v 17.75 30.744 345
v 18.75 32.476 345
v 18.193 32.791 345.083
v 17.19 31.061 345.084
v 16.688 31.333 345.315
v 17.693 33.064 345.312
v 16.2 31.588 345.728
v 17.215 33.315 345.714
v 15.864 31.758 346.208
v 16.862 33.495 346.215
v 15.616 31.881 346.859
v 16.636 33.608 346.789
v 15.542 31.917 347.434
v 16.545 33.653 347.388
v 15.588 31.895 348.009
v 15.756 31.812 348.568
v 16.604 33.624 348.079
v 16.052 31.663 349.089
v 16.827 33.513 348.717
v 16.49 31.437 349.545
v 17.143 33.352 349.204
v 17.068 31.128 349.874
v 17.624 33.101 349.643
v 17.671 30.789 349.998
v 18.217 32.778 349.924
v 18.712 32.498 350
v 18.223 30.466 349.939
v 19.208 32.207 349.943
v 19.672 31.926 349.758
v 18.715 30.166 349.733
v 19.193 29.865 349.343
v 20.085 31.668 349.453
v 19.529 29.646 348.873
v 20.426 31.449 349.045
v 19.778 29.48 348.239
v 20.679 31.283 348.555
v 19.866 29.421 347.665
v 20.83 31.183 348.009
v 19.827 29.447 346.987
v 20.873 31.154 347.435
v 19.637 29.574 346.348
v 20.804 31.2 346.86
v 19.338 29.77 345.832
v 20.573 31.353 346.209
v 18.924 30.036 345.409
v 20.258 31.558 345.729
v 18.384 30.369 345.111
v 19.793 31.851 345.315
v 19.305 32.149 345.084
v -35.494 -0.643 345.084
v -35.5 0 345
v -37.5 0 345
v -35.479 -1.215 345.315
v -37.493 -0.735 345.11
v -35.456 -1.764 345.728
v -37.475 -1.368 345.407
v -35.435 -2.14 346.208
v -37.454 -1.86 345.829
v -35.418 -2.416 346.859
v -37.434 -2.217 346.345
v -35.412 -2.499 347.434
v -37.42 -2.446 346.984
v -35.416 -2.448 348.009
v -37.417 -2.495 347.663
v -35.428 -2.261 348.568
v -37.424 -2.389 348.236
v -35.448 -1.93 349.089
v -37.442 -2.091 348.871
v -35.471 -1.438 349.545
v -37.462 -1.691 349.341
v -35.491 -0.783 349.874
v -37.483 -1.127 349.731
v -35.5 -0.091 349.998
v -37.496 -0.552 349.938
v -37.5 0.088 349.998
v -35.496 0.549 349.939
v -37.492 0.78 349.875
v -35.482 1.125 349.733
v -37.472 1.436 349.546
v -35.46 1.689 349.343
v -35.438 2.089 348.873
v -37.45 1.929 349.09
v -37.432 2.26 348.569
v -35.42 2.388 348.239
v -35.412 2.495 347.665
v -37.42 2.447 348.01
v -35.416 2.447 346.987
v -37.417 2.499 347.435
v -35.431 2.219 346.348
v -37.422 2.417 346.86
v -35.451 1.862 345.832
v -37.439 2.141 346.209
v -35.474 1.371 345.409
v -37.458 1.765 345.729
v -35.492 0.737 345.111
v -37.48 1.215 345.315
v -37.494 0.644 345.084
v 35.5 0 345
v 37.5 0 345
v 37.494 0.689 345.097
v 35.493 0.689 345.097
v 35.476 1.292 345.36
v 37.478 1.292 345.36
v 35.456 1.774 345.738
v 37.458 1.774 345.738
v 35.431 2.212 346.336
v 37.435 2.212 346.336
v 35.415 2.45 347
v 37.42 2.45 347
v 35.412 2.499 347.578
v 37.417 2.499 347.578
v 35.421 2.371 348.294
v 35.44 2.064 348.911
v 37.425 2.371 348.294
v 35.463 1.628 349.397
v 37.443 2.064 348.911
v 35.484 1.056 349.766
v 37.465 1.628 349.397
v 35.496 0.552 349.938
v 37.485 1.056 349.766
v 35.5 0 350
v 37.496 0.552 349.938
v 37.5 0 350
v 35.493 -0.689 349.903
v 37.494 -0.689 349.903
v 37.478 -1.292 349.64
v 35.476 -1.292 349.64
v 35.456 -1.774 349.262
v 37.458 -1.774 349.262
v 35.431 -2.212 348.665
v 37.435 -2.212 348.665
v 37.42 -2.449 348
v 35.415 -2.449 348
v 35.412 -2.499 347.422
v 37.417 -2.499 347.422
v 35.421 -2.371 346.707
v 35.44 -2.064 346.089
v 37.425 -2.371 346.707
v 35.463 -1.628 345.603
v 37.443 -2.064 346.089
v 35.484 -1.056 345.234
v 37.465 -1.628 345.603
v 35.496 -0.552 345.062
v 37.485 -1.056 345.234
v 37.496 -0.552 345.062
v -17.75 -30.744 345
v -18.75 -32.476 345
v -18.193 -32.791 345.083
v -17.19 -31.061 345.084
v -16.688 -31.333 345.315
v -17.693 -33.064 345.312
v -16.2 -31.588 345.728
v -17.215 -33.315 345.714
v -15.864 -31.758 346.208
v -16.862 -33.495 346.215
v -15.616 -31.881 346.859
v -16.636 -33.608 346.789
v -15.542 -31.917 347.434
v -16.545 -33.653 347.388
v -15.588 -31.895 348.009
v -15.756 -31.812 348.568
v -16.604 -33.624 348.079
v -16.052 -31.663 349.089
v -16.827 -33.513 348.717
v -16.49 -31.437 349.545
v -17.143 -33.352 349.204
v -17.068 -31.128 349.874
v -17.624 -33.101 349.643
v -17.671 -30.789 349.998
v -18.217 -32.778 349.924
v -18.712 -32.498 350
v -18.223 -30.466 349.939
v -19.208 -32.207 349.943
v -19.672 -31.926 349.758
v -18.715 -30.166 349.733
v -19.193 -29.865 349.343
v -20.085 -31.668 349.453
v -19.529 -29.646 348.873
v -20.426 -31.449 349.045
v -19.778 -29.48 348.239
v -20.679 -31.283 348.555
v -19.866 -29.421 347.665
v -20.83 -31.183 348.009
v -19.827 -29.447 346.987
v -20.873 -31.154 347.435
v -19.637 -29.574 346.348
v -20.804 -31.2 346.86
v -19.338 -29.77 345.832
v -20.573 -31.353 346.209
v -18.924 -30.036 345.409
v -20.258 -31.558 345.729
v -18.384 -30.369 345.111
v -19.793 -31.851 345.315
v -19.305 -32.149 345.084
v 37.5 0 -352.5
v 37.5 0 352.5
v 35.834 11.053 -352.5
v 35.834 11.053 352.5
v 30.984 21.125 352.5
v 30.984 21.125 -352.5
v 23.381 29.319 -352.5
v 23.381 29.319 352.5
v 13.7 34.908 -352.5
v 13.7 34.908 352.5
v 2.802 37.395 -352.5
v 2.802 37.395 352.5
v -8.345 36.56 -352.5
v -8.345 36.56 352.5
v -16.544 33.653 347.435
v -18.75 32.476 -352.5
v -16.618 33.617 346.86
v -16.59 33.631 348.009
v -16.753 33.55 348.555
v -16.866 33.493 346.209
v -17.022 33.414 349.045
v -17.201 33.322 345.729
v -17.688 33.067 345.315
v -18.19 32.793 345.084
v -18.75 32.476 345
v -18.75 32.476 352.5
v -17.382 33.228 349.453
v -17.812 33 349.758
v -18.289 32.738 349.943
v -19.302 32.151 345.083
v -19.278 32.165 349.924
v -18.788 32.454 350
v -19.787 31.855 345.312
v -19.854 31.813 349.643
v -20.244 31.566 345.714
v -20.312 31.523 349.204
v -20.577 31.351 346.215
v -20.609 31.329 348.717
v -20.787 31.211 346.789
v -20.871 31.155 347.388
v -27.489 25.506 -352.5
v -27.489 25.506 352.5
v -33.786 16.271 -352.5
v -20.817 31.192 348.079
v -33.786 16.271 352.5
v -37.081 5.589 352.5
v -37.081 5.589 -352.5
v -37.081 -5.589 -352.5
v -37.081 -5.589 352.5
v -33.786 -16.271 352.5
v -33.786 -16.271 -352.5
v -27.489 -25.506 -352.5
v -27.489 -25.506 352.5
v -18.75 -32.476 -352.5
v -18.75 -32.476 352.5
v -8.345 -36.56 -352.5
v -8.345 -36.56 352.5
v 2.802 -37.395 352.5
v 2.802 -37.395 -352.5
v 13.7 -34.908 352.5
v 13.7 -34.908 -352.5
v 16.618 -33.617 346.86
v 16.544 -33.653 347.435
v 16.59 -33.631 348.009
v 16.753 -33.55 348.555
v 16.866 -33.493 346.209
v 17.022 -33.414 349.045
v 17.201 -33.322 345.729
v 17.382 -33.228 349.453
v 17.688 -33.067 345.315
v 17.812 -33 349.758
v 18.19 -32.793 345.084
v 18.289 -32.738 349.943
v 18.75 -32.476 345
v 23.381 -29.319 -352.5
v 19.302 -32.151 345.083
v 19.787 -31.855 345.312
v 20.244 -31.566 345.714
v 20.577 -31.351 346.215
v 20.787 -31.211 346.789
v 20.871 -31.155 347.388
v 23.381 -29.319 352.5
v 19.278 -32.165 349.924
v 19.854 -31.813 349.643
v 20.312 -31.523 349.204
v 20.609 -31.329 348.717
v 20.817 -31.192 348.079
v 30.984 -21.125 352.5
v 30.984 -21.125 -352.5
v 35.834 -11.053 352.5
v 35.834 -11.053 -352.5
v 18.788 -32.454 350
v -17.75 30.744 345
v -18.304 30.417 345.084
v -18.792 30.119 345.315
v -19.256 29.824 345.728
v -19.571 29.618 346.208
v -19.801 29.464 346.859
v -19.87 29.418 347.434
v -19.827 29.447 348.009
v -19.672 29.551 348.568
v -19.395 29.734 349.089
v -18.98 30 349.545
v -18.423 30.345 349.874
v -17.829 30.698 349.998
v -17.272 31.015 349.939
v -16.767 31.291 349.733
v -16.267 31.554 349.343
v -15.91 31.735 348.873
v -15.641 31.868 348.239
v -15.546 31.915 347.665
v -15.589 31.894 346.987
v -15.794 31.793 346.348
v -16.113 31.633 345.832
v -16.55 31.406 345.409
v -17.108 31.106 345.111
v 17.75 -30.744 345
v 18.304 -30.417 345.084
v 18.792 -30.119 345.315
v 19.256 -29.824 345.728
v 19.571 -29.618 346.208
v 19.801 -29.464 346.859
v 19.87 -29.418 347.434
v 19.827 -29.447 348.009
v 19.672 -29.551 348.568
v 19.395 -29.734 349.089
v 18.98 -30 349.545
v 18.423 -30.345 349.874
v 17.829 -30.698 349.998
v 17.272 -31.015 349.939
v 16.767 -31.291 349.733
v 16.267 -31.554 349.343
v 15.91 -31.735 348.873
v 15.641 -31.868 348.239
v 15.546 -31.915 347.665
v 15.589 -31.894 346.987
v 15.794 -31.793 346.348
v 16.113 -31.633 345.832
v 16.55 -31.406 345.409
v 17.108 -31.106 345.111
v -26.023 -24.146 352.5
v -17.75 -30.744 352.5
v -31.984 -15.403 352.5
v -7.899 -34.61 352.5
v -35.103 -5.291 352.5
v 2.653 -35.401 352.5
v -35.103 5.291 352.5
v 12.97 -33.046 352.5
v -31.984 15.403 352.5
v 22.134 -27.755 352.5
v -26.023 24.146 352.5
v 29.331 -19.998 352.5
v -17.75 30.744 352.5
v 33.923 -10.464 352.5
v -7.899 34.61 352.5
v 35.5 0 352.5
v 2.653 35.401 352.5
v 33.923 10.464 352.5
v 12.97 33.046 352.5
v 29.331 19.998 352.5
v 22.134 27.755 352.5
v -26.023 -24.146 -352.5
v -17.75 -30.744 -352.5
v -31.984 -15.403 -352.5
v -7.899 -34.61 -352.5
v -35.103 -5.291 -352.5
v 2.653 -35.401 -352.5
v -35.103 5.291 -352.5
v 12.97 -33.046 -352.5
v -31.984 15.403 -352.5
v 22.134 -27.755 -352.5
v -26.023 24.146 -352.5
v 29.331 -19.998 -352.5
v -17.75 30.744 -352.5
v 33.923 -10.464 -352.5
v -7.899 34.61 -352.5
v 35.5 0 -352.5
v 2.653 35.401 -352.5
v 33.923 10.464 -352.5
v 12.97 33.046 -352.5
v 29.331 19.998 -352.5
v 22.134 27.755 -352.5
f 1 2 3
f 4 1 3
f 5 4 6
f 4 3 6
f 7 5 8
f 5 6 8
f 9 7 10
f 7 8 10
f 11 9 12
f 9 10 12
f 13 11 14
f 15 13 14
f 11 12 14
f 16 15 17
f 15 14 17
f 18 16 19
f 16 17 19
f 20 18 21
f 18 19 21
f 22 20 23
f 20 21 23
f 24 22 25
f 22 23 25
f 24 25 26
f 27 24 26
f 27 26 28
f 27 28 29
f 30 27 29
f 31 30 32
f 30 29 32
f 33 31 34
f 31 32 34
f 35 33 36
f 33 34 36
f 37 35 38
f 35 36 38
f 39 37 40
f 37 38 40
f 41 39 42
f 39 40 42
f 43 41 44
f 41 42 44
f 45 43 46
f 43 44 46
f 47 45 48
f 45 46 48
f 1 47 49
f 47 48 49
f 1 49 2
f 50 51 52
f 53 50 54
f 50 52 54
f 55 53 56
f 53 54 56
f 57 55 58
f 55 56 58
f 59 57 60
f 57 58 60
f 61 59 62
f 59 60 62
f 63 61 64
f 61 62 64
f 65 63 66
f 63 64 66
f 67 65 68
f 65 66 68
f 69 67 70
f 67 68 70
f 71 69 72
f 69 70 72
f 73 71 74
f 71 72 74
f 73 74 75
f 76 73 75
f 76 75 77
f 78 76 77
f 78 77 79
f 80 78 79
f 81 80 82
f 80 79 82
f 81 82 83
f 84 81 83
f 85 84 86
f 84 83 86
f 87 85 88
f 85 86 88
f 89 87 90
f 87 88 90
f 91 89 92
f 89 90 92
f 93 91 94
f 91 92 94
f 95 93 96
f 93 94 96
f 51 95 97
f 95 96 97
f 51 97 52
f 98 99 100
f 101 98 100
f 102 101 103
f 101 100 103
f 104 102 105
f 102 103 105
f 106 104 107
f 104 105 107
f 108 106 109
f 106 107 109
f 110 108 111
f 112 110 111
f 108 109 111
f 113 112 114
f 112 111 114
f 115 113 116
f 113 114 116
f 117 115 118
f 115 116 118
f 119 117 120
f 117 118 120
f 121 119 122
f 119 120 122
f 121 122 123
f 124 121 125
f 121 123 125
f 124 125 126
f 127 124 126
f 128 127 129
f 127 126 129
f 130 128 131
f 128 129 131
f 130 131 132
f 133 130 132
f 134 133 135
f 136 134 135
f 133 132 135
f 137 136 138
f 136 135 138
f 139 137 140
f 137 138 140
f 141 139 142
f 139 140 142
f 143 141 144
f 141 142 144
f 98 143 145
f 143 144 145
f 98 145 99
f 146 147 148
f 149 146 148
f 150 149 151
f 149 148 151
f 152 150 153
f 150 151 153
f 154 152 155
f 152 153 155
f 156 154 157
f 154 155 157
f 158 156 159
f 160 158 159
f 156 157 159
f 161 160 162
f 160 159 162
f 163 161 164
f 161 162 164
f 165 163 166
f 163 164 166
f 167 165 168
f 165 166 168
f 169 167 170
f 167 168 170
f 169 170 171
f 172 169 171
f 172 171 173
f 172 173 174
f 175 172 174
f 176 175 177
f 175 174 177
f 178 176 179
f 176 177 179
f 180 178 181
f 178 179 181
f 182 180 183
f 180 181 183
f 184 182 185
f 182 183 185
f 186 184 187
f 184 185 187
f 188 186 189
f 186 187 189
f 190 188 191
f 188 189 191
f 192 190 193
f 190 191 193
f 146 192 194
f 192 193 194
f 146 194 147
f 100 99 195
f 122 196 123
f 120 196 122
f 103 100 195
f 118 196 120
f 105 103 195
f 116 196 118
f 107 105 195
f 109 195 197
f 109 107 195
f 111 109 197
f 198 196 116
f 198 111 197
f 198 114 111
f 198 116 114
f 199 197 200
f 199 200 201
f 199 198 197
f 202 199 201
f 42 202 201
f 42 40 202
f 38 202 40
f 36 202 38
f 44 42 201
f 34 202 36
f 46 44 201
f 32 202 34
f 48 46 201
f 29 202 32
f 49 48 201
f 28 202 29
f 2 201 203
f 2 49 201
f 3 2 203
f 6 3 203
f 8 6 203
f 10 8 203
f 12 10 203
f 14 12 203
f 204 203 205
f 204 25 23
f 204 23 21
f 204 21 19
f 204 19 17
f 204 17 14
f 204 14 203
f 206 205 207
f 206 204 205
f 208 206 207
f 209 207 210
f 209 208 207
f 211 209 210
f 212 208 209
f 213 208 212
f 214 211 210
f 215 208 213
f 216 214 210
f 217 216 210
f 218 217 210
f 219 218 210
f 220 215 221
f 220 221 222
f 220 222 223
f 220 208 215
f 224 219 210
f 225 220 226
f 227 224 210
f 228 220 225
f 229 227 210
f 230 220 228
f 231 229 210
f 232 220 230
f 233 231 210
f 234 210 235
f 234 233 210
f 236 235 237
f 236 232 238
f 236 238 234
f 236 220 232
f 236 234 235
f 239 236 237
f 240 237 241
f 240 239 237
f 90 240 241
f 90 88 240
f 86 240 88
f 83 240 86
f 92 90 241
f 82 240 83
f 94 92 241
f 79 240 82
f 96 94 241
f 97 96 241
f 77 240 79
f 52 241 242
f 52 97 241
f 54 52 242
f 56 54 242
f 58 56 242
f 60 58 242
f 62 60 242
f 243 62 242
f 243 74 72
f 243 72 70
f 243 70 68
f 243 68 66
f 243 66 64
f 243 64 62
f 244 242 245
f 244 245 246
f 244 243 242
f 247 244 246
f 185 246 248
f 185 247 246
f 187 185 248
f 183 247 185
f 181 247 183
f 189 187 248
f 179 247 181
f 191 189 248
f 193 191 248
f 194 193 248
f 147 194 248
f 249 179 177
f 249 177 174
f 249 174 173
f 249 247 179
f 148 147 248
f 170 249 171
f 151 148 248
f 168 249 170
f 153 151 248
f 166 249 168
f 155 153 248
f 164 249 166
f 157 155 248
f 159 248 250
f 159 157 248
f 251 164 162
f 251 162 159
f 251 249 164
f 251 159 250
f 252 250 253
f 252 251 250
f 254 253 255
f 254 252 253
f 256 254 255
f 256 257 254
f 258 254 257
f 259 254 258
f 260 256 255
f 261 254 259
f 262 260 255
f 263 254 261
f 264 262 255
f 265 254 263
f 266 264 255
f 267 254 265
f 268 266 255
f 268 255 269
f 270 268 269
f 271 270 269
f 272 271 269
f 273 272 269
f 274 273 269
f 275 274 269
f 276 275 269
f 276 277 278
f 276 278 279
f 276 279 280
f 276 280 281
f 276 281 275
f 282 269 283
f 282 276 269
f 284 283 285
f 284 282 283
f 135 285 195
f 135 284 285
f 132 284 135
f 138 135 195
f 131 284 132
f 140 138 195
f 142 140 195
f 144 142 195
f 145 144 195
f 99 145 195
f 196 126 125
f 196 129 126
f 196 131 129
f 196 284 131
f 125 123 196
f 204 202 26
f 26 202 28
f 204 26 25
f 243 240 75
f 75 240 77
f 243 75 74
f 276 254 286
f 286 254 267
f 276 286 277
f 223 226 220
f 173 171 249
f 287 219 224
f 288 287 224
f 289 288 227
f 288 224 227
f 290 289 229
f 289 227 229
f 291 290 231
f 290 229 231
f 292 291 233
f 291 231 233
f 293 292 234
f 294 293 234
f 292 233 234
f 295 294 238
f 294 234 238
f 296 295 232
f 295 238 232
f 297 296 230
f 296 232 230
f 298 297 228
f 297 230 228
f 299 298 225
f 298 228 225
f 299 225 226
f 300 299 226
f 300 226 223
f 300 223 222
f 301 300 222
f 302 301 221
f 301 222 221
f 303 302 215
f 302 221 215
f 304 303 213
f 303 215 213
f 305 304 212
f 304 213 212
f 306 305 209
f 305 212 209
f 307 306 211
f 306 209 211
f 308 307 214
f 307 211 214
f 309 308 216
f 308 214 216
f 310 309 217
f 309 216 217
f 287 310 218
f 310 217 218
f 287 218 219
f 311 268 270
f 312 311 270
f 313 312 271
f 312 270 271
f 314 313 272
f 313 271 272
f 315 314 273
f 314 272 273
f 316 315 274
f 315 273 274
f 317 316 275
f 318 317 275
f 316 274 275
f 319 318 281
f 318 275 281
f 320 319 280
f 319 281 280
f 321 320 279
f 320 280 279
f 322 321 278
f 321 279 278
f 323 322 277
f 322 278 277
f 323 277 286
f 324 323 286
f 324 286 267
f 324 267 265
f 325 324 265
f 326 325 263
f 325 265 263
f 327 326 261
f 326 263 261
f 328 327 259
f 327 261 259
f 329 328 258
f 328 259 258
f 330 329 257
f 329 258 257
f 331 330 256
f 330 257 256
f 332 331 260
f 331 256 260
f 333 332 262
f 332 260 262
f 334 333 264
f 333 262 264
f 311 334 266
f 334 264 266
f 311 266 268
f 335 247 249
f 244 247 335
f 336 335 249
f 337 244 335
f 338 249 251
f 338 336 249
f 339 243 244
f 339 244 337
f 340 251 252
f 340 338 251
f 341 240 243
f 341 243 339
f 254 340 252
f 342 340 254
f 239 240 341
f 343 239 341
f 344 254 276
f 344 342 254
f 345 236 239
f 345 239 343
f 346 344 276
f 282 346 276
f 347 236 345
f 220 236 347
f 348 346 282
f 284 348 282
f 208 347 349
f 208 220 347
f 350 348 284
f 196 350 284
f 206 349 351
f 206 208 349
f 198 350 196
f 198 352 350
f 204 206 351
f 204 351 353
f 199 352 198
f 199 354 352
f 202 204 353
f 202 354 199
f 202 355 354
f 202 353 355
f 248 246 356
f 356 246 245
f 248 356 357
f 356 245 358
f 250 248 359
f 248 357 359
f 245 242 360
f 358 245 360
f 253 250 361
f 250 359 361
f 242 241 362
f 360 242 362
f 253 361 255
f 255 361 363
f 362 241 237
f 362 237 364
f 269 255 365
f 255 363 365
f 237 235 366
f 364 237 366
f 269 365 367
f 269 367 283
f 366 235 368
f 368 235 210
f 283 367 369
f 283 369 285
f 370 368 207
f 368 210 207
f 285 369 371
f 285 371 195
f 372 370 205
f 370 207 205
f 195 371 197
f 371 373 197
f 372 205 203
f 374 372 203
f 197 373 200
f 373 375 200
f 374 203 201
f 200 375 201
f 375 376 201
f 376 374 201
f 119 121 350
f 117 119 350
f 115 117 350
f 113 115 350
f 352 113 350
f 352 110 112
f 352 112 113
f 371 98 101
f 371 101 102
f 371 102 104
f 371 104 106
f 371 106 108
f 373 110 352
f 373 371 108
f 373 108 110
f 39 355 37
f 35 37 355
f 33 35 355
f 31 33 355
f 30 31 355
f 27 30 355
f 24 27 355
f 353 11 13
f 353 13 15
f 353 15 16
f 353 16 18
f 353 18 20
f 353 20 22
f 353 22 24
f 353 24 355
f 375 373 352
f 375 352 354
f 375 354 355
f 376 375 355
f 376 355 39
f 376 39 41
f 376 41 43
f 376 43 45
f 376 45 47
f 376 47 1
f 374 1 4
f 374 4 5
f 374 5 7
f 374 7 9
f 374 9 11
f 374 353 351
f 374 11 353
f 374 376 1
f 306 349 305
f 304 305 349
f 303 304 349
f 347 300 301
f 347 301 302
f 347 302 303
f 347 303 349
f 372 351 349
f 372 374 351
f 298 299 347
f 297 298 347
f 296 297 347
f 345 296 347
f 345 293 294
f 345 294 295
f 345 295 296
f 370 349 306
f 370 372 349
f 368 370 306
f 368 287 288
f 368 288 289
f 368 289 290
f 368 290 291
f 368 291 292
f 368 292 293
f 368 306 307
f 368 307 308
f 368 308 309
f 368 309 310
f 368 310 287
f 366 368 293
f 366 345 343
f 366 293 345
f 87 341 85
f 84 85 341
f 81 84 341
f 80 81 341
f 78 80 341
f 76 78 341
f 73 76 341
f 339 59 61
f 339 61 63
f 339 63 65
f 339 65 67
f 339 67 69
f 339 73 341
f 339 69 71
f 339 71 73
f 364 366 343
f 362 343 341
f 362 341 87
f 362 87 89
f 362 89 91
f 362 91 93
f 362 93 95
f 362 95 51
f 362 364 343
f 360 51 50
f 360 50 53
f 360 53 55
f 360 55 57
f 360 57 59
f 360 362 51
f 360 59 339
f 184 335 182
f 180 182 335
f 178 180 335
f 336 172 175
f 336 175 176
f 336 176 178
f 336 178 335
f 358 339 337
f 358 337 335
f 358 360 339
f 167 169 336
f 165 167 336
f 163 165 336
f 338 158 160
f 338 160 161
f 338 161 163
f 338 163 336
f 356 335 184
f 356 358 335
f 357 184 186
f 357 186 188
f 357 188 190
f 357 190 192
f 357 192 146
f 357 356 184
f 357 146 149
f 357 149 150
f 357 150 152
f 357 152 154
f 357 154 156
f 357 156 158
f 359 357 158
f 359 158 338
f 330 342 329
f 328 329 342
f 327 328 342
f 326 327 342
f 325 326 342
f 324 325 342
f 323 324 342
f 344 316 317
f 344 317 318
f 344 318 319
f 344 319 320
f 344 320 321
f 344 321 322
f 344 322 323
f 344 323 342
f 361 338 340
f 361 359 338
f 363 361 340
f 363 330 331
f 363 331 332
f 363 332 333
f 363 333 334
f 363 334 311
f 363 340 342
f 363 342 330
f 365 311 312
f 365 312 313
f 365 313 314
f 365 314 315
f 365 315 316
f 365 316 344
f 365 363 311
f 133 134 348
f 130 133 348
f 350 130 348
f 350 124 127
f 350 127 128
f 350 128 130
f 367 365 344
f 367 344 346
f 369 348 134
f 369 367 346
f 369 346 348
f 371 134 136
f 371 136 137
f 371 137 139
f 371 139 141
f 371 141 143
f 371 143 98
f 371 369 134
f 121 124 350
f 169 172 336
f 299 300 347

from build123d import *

# Parameters (mm, degrees)
SKETCH1_R               = 37.5
SKETCH1_R_2             = 35.5
BOSS_EXTRUDE1_DEPTH     = 352.5
CUT_EXTRUDE1_REACH      = 364.336
CUT_EXTRUDE1_END_RADIUS = 35.5
SKETCH2_R               = 2.5
CIRPATTERN1_COUNT       = 6


with BuildPart() as part:
    # Sketch1 → Boss-Extrude1 (new, symmetric)
    with BuildSketch(Plane.XY):
        Circle(SKETCH1_R)
        Circle(SKETCH1_R_2, mode=Mode.SUBTRACT)
    extrude(amount=BOSS_EXTRUDE1_DEPTH, both=True)

    # Cut-Extrude1: up to this cylinder (the profile starts outside it)
    cut_extrude1_end = Plane(origin=(0, 0, 347.5), z_dir=(0, 0, -1)) * Cylinder(CUT_EXTRUDE1_END_RADIUS, 800.672, mode=Mode.PRIVATE)
    # Sketch2 → Cut-Extrude1 (cut, up to the surface)
    with BuildSketch(Plane(origin=(37.5, 0, 0), x_dir=(0, 0, -1), z_dir=(1, 0, 0)), mode=Mode.PRIVATE) as cut_extrude1_sk1:
        with Locations((-347.5, 0)):
            Circle(SKETCH2_R)
    cut_extrude1_tool1 = extrude(cut_extrude1_sk1.sketch, amount=-CUT_EXTRUDE1_REACH, mode=Mode.PRIVATE) - cut_extrude1_end
    cut_extrude1 = cut_extrude1_tool1.solids().sort_by_distance((37.5, 0, 347.5))[0]
    add(cut_extrude1, mode=Mode.SUBTRACT)

    # CirPattern1: Cut-Extrude1 ×6 about axis
    cirpattern1_axis = Axis((0, 0, 352.5), (0, 0, 1))
    for i in range(1, CIRPATTERN1_COUNT):
        add(cut_extrude1.rotate(cirpattern1_axis, i * 360 / CIRPATTERN1_COUNT), mode=Mode.SUBTRACT)


solid = part.part
